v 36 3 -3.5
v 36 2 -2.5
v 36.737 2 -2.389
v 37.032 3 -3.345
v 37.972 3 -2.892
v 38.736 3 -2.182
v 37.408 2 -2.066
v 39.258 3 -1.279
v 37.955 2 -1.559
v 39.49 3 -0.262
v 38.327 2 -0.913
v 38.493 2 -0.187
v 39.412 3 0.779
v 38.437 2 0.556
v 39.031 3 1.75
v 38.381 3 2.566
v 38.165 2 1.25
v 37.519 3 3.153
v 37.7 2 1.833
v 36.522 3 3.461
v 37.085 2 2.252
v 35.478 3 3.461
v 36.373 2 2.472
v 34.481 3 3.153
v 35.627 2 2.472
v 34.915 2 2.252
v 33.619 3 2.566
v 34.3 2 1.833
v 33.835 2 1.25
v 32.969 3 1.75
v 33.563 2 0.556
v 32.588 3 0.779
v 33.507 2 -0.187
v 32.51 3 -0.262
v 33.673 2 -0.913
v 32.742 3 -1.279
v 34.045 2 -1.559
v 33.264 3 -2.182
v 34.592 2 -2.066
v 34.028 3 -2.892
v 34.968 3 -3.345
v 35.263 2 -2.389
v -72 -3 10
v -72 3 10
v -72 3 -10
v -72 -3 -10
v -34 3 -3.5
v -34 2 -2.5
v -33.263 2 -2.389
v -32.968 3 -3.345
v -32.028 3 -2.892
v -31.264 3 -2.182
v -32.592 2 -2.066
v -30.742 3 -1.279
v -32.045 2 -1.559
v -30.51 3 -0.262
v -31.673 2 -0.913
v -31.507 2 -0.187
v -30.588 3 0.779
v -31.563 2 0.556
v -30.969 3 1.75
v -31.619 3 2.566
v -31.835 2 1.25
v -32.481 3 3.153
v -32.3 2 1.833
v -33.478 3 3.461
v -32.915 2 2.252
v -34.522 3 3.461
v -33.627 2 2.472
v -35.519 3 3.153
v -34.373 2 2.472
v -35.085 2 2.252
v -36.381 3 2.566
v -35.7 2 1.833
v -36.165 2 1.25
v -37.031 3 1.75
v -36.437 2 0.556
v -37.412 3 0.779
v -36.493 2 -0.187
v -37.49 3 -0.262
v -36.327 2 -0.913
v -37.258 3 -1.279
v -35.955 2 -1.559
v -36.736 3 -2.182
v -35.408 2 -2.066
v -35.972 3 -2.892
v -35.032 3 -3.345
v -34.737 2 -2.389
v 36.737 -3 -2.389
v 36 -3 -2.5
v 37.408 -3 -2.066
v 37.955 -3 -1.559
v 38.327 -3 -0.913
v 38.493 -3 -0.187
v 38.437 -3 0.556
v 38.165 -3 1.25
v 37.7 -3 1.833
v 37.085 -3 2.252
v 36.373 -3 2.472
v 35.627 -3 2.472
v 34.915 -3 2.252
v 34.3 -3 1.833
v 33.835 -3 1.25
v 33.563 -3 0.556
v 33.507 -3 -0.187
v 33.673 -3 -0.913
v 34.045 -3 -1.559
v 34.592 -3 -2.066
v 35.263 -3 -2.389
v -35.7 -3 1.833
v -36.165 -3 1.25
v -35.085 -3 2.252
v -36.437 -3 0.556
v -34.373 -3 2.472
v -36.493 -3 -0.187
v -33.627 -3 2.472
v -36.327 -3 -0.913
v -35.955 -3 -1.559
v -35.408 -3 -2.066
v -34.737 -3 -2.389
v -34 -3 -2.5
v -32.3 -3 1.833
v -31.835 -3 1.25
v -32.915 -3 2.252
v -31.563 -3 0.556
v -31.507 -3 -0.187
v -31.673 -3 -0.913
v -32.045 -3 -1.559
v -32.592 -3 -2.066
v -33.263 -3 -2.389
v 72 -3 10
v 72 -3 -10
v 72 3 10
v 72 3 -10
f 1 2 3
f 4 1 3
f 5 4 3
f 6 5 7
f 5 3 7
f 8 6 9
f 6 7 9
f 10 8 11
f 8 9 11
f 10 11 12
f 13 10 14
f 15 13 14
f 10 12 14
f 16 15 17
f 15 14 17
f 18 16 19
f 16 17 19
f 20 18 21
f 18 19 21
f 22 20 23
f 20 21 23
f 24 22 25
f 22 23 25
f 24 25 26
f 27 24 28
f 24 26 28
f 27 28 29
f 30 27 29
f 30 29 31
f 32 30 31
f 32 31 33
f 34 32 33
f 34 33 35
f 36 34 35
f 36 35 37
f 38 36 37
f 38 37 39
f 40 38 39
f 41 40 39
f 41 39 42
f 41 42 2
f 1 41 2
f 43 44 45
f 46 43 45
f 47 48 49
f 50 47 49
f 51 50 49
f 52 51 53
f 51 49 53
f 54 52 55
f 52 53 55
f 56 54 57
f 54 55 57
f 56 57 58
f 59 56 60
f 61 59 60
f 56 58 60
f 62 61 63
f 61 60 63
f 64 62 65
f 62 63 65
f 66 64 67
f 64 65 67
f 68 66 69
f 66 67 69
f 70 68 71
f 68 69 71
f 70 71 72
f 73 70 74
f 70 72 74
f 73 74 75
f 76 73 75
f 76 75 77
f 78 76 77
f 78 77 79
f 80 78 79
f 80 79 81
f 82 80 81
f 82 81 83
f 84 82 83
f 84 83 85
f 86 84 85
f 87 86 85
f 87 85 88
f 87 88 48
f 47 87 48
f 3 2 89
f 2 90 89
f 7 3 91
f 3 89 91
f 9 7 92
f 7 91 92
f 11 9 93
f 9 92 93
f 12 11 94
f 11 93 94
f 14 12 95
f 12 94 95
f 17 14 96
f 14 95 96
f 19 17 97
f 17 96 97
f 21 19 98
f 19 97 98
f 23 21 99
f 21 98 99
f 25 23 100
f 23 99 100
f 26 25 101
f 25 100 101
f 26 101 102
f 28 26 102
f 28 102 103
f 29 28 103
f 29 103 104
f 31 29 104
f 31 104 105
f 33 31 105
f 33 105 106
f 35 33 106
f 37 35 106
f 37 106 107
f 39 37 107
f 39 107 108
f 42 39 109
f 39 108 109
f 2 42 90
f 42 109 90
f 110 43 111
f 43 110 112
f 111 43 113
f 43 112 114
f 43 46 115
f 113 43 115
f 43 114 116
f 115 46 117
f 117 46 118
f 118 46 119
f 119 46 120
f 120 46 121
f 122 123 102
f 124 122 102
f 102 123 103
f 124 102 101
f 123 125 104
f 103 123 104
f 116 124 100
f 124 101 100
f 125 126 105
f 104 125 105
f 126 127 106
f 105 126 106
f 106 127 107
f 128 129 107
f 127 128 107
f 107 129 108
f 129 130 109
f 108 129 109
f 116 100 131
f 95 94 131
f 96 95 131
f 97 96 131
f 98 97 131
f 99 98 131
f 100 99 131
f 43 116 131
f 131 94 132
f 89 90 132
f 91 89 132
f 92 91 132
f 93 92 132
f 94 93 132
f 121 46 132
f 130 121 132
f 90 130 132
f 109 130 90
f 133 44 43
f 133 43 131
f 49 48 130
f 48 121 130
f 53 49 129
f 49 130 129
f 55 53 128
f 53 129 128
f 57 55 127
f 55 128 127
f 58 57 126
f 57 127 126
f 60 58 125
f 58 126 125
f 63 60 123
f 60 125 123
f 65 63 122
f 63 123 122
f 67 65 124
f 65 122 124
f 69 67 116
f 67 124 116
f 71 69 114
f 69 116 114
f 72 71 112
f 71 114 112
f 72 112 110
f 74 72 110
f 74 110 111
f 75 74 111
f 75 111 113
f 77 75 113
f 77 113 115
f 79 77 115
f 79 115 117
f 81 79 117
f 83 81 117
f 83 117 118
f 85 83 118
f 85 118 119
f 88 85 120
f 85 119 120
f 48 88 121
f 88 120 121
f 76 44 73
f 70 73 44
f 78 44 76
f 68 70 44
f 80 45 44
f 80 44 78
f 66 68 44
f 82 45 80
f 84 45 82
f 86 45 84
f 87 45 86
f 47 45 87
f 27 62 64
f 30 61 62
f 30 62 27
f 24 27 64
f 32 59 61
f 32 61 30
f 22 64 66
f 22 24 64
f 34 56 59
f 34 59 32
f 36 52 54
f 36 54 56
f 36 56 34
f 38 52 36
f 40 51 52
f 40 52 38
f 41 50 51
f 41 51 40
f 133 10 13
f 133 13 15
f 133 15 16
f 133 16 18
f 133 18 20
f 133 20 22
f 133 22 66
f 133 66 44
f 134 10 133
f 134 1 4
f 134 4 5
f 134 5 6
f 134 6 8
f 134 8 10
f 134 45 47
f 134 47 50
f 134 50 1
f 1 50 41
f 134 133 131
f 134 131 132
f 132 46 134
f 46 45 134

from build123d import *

# Parameters (mm, degrees)
SKETCH2_W                                         = 144
SKETCH2_H                                         = 20
BOSS_EXTRUDE1_DEPTH                               = 3
CSK_FOR_0_FLAT_HEAD_MACHINE_SCREW_100_D           = 4.999999906
CSK_FOR_0_FLAT_HEAD_MACHINE_SCREW_100_CSINK_D     = 6.99999997
CSK_FOR_0_FLAT_HEAD_MACHINE_SCREW_100_CSINK_ANGLE = 90


with BuildPart() as part:
    # Sketch2 → Boss-Extrude1 (new, symmetric)
    with BuildSketch(Plane(origin=(0, 0, 0), x_dir=(1, 0, 0), z_dir=(0, 1, 0))):
        Rectangle(SKETCH2_W, SKETCH2_H)
    extrude(amount=BOSS_EXTRUDE1_DEPTH, both=True)

    # CSK for #0 Flat Head Machine Screw (100)1 (through all)
    with Locations(Plane(origin=(-34, 3, 0), x_dir=(0, 0, 1), z_dir=(0, 1, 0))):
        with Locations((0, 0), (0, 70)):
            CounterSinkHole(CSK_FOR_0_FLAT_HEAD_MACHINE_SCREW_100_D / 2, CSK_FOR_0_FLAT_HEAD_MACHINE_SCREW_100_CSINK_D / 2, counter_sink_angle=CSK_FOR_0_FLAT_HEAD_MACHINE_SCREW_100_CSINK_ANGLE)


solid = part.part
